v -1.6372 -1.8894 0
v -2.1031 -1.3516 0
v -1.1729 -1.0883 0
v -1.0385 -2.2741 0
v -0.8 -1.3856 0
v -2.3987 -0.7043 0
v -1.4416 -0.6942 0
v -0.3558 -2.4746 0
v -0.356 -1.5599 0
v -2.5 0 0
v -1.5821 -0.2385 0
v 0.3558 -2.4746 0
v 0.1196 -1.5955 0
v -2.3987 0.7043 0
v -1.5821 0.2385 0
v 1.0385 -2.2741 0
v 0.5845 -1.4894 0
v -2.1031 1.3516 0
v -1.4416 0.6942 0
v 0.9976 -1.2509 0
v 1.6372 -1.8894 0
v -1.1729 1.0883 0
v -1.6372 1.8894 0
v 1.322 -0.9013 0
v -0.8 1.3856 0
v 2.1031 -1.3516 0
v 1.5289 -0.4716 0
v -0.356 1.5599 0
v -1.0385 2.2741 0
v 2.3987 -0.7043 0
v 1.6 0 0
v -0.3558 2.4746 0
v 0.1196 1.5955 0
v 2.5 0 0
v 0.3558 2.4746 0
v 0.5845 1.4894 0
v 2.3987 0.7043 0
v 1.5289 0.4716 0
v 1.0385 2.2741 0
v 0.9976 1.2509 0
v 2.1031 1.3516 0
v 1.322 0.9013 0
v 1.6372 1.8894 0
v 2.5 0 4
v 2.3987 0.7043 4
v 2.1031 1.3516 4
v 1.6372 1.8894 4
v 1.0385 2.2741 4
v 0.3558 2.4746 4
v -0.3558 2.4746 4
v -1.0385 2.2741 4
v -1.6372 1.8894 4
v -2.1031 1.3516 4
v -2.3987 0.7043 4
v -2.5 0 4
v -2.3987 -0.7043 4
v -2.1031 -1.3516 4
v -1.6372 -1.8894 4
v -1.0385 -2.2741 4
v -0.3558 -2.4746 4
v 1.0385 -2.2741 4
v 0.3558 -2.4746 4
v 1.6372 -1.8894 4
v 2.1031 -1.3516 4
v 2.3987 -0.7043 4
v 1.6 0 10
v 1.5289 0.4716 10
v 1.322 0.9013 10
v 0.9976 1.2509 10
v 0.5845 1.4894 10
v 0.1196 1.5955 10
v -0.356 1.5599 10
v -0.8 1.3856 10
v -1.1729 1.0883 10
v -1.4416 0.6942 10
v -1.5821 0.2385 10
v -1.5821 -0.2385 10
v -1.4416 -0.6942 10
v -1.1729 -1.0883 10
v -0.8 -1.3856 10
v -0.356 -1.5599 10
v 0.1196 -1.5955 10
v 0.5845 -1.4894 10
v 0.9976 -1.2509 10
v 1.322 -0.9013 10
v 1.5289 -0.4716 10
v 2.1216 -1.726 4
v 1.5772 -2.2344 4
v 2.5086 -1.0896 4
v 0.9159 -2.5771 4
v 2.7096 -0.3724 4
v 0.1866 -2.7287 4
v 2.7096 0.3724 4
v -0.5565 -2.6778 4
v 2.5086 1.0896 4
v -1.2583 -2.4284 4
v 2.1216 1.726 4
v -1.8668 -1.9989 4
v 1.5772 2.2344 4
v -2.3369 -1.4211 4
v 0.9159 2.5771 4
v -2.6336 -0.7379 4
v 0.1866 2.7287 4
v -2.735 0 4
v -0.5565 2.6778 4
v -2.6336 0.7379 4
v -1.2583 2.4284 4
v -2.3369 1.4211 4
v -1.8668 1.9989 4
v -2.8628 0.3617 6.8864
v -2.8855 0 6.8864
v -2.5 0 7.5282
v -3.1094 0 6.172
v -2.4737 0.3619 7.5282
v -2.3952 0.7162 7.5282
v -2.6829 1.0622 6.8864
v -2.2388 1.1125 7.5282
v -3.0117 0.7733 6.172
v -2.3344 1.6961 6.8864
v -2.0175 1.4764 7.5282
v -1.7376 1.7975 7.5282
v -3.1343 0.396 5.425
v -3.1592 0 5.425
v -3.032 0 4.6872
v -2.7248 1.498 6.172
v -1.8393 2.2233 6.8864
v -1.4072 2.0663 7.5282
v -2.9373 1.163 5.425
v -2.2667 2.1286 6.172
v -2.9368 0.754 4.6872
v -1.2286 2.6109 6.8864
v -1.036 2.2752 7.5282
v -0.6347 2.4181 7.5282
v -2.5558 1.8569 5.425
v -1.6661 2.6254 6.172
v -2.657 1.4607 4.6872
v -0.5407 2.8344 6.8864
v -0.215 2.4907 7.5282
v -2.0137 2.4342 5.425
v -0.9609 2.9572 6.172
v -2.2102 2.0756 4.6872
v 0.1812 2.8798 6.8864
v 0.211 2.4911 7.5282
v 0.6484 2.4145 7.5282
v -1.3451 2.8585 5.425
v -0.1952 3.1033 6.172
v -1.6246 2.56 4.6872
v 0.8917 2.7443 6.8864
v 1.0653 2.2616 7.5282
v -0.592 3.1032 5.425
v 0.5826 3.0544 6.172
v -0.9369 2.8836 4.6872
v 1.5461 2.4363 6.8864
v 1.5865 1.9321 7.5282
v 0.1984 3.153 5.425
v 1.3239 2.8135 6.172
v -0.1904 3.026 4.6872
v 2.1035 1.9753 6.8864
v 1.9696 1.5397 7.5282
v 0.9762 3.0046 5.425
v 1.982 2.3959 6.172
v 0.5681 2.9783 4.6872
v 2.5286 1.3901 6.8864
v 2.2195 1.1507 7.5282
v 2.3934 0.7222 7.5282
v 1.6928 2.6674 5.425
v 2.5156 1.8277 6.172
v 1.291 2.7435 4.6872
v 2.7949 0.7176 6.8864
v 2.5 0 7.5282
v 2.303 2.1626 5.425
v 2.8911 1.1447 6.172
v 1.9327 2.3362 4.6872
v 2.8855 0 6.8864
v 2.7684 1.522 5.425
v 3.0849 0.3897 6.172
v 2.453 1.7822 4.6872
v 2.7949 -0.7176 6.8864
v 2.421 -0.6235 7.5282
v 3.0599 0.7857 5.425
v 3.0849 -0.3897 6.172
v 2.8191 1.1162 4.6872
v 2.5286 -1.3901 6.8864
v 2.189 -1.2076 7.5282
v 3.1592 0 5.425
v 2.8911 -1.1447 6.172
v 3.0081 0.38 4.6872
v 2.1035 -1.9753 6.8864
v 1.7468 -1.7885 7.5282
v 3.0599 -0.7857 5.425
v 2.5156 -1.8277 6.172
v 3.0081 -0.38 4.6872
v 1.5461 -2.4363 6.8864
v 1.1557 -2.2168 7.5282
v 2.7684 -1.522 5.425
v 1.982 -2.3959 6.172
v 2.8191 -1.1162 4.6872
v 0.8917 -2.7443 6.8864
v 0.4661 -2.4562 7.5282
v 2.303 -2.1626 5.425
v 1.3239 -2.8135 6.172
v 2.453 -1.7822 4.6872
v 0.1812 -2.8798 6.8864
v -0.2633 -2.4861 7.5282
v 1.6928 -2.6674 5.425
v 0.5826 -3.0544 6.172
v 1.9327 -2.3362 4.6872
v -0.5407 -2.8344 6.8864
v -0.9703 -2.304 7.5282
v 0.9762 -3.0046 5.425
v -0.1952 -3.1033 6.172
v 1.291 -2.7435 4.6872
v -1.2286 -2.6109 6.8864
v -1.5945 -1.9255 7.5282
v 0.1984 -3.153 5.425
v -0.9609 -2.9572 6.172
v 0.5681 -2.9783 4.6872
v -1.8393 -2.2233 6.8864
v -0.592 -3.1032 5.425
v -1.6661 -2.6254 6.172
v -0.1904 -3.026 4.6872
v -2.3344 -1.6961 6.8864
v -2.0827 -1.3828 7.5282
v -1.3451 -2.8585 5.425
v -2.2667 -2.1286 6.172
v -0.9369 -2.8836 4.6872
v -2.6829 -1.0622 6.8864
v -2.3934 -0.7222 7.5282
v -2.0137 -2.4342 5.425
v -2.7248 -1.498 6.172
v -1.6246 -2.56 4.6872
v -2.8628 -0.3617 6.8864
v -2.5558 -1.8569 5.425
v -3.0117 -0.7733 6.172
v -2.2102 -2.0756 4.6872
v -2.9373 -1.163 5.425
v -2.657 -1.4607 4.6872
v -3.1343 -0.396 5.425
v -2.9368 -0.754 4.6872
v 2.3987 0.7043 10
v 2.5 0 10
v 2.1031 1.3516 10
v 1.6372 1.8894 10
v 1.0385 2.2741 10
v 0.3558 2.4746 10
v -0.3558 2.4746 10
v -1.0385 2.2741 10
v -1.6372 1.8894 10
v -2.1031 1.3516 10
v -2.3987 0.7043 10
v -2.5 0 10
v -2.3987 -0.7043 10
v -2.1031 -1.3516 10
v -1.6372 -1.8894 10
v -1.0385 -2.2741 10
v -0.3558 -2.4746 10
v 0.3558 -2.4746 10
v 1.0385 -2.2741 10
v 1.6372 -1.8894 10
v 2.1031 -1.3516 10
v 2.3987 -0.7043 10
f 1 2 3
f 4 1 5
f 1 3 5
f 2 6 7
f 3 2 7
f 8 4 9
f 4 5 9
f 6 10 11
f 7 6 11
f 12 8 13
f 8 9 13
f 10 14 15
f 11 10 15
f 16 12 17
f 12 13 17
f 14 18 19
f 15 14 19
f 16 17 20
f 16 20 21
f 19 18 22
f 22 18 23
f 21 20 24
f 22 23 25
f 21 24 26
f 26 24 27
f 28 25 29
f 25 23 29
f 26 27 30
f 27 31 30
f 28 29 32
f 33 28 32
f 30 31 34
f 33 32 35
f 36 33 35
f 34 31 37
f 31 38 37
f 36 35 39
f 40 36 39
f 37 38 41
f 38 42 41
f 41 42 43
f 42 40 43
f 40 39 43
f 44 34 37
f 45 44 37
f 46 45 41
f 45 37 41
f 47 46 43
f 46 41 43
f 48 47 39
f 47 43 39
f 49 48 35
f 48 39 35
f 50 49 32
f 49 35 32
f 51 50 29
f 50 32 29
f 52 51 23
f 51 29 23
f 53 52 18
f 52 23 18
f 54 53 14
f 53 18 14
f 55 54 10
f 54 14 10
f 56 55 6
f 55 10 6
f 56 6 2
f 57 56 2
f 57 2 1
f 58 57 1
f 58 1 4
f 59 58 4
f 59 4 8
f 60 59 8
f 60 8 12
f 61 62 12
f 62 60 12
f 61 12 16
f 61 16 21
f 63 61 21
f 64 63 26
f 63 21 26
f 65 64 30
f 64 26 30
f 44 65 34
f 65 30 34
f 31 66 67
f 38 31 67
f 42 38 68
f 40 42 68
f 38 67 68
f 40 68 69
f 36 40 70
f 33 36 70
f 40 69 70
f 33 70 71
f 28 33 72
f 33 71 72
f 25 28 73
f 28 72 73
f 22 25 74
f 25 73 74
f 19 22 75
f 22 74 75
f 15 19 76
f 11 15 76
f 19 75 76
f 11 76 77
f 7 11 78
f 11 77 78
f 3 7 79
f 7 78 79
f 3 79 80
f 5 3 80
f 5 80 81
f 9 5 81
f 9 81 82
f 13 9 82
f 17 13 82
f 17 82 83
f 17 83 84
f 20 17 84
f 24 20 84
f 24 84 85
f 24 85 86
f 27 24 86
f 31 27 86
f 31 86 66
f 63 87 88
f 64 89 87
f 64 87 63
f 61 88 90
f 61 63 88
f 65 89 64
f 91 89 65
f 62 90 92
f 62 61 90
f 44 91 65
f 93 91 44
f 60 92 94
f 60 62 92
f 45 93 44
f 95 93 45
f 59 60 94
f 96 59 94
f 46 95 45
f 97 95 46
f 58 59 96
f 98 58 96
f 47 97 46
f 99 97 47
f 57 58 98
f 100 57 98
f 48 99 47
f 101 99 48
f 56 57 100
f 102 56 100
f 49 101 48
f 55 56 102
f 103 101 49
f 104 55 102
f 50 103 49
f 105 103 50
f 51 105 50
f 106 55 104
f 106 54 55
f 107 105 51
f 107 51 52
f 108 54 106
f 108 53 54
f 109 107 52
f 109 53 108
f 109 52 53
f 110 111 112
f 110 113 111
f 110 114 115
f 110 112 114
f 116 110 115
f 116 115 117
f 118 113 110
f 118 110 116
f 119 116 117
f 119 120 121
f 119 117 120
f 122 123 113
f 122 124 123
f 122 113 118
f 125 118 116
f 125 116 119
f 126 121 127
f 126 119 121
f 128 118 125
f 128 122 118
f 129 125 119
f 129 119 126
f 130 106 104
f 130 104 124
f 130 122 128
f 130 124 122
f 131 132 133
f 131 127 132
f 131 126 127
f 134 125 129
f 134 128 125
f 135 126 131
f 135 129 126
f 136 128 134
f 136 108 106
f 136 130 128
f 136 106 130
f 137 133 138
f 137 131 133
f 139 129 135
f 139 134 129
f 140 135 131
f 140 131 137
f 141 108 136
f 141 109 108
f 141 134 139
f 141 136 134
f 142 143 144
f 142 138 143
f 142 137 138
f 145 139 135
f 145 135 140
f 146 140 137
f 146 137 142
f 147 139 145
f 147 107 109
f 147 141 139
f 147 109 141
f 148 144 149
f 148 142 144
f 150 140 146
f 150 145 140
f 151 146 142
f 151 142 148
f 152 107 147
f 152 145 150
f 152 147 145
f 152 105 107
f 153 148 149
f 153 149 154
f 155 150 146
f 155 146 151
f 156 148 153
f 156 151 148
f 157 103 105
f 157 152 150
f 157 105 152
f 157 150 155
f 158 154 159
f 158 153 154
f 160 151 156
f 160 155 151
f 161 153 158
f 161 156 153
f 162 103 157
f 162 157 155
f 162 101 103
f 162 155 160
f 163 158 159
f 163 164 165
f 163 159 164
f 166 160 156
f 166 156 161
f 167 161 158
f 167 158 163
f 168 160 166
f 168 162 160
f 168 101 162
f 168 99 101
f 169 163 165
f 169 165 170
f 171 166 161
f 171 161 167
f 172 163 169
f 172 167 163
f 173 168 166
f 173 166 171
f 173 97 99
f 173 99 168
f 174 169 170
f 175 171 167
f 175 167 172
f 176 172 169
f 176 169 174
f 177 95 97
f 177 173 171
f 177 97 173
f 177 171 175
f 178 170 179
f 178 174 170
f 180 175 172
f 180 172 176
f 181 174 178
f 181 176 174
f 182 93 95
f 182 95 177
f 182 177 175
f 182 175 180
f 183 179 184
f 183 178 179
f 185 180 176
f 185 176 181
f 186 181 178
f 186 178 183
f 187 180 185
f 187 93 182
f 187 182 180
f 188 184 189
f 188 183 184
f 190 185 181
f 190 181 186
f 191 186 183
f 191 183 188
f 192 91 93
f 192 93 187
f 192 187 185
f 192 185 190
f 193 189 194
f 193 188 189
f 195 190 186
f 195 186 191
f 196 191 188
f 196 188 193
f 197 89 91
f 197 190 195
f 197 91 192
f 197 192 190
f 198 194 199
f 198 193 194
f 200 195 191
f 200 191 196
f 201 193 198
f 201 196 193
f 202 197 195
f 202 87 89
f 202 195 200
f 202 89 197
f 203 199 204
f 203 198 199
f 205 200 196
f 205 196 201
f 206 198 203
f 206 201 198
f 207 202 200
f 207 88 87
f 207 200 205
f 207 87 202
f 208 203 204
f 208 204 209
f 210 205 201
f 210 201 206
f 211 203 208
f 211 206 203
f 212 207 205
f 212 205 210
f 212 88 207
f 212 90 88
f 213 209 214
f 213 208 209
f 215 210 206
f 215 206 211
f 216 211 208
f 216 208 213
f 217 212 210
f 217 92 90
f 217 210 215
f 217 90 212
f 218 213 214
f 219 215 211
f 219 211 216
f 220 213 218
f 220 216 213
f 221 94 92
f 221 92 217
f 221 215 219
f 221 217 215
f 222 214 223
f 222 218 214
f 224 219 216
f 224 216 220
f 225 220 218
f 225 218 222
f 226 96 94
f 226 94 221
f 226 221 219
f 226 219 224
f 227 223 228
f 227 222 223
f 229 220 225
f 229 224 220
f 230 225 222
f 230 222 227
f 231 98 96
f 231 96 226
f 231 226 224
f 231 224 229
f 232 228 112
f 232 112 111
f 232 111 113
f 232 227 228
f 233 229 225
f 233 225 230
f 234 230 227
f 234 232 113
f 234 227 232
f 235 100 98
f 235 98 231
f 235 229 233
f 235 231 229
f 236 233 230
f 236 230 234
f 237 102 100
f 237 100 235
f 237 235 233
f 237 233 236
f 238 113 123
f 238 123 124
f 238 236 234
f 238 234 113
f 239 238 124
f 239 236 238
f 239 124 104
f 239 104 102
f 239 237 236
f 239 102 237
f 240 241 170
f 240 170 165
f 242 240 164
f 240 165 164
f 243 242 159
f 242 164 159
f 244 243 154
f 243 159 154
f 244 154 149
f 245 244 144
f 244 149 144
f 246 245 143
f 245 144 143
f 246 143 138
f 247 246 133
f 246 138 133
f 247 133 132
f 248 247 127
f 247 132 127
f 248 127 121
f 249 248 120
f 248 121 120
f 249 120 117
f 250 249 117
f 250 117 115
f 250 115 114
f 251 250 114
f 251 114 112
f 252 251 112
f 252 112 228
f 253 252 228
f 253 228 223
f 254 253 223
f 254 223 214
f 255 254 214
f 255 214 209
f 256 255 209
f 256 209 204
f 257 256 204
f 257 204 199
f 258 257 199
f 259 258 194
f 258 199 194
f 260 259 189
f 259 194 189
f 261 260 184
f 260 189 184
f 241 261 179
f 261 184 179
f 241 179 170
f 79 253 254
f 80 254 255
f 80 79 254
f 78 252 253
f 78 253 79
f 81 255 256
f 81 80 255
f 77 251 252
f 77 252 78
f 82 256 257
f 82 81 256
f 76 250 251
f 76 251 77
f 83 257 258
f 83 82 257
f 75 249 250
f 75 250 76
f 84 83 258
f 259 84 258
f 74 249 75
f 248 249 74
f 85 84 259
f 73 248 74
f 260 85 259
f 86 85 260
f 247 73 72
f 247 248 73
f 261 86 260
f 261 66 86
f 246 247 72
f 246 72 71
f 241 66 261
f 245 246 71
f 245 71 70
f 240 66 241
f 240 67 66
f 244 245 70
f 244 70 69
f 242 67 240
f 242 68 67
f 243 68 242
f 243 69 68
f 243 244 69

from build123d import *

# Parameters (mm, degrees)
SKETCH_1_R          = 2.5
EXTRUDE_1_DEPTH     = 10
SKETCH_3_R          = 1.6
CUT_EXTRUDE_1_DEPTH = 11.955148971


with BuildPart() as part:
    # 草图1 → 凸台-拉伸1 (new body)
    with BuildSketch(Plane.XY):
        Circle(SKETCH_1_R)
    extrude(amount=EXTRUDE_1_DEPTH)

    # 草图2 → 旋转1 (revolve)
    with BuildSketch(Plane(origin=(0, 0, 0), x_dir=(1, 0, 0), z_dir=(0, 1, 0))):
        with BuildLine():
            Line((0, -8), (-2.048968216, -8))
            ThreePointArc((-2.048968216, -8), (-3.117957315, -6.124512969), (-2.735029198, -4))
            Line((-2.735029198, -4), (0, -4))
            Line((0, -4), (0, -8))
        make_face()
    revolve(axis=Axis((0, 0, 8), (0, 0, -1)))

    # 草图3 → 切除-拉伸1 (cut, through all)
    with BuildSketch(Plane.XY.offset(10)):
        Circle(SKETCH_3_R)
    extrude(amount=-CUT_EXTRUDE_1_DEPTH, mode=Mode.SUBTRACT)


solid = part.part
